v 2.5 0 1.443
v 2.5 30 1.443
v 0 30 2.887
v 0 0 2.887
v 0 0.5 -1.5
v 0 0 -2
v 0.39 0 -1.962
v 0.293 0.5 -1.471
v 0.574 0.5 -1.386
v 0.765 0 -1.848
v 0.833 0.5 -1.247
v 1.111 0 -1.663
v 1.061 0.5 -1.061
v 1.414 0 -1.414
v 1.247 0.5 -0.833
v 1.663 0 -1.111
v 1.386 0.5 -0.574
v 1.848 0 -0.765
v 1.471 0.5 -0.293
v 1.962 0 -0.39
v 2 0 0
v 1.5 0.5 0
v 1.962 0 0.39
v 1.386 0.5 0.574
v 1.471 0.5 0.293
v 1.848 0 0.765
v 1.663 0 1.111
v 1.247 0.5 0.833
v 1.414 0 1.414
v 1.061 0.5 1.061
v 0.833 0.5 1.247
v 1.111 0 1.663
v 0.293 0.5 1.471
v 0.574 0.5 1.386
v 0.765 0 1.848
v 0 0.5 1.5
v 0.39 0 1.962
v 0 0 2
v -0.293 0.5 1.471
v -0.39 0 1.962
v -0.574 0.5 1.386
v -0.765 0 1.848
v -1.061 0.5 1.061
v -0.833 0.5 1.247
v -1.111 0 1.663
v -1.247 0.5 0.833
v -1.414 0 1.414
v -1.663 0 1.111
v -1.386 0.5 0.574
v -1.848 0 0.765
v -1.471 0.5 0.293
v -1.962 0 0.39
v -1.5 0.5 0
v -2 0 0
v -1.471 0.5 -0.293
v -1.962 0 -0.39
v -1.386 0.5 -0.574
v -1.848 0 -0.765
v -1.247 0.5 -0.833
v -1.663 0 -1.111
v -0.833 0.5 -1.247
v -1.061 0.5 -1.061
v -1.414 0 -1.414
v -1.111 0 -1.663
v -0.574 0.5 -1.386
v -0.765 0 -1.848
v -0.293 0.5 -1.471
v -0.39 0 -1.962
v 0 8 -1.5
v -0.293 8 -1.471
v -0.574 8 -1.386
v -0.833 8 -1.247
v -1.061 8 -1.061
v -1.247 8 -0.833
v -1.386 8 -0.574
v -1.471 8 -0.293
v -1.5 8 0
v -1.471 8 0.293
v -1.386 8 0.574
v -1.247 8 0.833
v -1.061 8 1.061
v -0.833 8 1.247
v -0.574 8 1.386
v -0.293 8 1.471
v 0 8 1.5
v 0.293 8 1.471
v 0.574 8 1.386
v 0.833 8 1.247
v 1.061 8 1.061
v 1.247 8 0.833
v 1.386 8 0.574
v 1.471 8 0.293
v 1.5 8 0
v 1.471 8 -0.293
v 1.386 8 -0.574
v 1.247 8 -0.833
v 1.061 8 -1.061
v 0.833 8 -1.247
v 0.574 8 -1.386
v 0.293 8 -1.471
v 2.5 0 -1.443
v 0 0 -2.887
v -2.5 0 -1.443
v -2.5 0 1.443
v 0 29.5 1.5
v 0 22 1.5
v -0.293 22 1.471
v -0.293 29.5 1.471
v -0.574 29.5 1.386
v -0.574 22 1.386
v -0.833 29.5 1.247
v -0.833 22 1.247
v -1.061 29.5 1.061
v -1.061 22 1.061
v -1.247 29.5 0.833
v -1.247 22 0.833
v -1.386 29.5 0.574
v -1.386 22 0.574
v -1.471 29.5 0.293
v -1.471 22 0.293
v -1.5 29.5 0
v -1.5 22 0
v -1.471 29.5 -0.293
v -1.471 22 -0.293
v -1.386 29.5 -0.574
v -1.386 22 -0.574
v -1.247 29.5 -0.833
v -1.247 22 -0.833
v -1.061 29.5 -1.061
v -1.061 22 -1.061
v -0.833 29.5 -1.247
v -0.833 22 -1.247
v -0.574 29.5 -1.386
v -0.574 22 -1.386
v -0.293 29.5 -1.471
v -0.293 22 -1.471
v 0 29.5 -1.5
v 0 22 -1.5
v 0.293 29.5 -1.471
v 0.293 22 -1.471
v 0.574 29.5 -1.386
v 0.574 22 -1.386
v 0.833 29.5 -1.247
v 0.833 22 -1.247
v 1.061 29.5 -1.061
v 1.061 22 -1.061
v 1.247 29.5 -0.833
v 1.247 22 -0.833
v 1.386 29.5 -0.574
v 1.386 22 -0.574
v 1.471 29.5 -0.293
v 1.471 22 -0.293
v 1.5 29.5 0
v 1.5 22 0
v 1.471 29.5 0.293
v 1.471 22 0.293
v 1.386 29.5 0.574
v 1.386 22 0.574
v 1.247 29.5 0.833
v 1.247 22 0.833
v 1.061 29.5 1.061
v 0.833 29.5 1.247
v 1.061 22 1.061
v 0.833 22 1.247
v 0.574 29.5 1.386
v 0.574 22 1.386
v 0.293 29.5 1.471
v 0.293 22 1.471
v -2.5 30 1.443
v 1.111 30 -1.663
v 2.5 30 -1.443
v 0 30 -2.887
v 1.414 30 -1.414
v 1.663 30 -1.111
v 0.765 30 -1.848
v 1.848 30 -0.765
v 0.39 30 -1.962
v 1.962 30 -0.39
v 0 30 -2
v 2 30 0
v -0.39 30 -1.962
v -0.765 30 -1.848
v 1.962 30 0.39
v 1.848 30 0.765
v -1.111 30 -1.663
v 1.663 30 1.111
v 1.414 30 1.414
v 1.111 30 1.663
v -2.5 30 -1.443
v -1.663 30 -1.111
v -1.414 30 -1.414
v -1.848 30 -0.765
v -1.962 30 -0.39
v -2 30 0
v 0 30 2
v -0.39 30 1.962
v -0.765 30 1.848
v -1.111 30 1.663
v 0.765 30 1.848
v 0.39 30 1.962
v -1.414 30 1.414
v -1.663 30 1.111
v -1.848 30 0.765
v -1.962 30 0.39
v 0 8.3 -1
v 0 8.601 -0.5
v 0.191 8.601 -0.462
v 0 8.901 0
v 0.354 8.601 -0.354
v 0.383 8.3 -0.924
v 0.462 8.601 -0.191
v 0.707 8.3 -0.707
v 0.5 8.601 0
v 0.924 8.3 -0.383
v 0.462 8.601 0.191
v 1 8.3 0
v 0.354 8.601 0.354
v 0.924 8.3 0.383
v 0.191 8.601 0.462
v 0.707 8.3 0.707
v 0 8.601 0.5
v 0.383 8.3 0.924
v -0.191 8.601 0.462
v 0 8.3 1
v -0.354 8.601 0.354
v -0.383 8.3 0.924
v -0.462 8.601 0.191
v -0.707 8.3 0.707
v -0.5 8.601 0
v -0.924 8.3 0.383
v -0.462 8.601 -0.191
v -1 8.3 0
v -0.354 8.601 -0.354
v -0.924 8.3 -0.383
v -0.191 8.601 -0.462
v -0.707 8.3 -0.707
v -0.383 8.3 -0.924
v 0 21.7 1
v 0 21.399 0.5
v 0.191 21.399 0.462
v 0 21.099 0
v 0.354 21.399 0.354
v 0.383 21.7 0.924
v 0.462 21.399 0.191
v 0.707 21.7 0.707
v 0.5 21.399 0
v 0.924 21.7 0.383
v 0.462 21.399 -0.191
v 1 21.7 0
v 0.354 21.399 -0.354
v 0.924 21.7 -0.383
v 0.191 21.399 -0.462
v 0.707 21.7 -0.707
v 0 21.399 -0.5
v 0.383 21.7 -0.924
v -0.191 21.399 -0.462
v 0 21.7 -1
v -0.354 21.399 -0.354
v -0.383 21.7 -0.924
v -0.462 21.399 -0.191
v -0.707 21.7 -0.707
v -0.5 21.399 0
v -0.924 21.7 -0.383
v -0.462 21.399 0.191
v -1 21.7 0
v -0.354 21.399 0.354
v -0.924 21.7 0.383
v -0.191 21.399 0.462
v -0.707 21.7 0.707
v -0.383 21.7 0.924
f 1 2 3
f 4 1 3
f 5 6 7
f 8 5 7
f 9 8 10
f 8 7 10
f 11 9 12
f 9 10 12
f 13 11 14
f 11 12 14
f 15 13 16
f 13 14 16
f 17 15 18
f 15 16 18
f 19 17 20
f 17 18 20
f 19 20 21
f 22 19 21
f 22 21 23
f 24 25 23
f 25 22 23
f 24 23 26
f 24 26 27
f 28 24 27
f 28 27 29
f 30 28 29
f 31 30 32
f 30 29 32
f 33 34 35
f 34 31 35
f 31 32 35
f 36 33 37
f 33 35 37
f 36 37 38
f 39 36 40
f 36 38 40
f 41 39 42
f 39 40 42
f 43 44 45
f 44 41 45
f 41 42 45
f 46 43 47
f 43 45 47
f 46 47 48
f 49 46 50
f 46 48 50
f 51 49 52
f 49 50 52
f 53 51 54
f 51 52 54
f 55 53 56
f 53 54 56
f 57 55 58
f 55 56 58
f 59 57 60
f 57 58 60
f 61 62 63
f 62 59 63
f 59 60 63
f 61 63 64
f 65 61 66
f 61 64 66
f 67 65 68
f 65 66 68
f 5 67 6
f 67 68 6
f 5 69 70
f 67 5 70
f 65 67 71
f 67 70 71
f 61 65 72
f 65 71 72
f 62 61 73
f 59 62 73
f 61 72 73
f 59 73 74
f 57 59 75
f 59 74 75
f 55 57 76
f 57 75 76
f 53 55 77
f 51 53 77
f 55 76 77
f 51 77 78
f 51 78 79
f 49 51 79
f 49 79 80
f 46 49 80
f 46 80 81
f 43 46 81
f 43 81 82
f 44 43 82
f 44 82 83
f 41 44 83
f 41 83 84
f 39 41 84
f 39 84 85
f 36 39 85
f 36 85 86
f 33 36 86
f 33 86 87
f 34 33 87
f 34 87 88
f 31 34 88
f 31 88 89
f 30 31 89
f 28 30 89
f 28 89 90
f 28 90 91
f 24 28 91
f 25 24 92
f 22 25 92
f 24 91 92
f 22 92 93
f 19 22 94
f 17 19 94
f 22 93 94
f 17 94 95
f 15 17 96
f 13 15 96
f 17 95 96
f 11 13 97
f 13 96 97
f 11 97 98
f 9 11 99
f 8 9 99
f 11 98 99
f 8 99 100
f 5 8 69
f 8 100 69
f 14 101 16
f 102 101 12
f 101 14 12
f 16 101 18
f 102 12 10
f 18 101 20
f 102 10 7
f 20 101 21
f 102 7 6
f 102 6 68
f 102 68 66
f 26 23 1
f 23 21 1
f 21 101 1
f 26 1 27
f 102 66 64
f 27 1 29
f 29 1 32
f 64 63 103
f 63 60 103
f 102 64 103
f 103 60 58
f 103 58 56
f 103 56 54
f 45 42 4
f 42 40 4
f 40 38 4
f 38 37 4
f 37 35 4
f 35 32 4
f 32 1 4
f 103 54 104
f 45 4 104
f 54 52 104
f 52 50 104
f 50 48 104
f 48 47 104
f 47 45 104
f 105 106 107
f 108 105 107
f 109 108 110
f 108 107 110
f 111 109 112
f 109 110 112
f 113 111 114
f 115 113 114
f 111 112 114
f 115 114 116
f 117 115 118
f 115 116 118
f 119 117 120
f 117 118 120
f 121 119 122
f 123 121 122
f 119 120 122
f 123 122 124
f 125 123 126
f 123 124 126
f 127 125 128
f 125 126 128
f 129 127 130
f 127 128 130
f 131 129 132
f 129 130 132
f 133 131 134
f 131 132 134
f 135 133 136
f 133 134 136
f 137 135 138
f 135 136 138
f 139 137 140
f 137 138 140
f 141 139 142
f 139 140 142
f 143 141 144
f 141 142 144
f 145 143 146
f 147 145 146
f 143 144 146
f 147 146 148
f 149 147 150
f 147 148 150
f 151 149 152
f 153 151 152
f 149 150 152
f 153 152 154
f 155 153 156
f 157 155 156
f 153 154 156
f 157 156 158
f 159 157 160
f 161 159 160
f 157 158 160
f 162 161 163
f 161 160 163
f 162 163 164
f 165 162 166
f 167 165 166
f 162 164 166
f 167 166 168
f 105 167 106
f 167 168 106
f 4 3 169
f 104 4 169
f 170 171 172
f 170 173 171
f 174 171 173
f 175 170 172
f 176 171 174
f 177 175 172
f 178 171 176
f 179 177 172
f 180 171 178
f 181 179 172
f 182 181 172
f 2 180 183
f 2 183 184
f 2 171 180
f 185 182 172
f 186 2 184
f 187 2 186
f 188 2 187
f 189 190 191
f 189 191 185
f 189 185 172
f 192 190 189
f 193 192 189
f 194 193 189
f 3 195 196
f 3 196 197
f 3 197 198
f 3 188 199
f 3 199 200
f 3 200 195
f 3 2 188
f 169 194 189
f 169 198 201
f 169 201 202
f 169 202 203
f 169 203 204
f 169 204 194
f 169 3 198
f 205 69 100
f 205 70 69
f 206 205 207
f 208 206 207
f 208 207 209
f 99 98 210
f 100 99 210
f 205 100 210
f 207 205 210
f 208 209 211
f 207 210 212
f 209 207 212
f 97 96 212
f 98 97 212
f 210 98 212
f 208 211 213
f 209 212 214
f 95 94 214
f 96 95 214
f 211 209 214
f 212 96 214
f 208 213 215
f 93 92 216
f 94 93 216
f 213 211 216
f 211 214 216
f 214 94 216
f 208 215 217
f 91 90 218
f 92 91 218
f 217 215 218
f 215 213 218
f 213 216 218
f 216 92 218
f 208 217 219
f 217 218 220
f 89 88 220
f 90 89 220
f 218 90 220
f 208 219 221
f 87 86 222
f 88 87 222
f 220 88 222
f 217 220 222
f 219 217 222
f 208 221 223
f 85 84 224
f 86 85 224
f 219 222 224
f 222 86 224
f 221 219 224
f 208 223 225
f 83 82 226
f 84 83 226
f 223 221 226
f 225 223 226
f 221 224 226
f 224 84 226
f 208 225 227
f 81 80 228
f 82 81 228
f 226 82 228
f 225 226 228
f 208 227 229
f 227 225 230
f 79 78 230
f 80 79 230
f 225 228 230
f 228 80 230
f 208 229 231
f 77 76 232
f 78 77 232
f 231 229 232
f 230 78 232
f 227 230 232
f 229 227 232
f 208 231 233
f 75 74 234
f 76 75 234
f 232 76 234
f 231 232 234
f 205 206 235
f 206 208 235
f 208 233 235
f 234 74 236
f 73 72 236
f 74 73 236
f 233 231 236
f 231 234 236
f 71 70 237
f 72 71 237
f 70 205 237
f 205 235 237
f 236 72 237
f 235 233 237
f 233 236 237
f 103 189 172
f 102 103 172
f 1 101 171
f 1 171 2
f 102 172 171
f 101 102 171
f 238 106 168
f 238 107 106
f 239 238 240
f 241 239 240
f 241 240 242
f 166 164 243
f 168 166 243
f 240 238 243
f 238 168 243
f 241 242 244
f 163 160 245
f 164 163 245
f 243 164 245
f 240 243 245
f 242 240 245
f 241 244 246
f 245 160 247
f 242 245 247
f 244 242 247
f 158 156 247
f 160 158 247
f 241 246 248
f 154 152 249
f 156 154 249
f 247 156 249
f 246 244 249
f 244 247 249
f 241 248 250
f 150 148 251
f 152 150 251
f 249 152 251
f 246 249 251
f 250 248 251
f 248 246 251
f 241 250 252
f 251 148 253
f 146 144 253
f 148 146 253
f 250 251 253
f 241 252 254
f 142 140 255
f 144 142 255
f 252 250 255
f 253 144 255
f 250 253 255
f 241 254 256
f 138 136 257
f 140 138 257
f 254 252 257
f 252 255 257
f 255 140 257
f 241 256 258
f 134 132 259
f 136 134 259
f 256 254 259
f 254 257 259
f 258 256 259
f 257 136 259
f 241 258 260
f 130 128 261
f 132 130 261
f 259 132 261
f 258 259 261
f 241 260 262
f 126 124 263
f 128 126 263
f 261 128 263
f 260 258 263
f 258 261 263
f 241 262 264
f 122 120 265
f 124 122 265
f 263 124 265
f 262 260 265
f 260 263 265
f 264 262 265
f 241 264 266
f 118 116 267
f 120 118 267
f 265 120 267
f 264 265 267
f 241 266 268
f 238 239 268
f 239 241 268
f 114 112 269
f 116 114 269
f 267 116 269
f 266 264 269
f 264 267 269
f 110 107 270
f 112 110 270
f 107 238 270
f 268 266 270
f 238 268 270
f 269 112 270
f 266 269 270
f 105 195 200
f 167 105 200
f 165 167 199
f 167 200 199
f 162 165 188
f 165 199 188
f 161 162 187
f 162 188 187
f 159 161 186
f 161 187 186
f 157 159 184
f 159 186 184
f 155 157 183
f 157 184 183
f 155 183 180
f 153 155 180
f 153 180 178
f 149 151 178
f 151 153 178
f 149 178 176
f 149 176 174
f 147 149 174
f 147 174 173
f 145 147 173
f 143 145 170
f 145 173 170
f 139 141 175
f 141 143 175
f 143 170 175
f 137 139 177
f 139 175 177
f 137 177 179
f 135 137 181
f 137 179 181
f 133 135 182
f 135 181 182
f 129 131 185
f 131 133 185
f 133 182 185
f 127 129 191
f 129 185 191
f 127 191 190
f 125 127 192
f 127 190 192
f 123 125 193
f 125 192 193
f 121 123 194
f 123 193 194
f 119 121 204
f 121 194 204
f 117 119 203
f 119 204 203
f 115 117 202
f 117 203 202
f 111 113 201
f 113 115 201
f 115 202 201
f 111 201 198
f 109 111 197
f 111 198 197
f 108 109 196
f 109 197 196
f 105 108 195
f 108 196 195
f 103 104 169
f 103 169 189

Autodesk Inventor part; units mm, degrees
ref_plane "YZ Plane" through (0, 0, 0) normal (1, 0, 0) x (0, 1, 0)
ref_plane "XZ Plane" through (0, 0, 0) normal (0, 1, 0) x (-1, 0, 0)
ref_plane "XY Plane" through (0, 0, 0) normal (0, 0, 1) x (1, 0, 0)
sketch "Boceto1" plane through (0, 0, 0) normal (0, 1, 0) x (-1, 0, 0)
  line L0 (2.5, -1.4434) -> (0, -2.8868)
  line L1 (0, -2.8868) -> (-2.5, -1.4434)
  line L2 (-2.5, -1.4434) -> (-2.5, 1.4434)
  line L3 (-2.5, 1.4434) -> (0, 2.8868)
  line L4 (0, 2.8868) -> (2.5, 1.4434)
  line L5 (2.5, 1.4434) -> (2.5, -1.4434)
  point P0 (0, 0)
  point P1 (0, 0)
  dimension "d0" = 5
extrude "Extrusión1" add sketch "Boceto1" along normal blind 30
sketch "Boceto2" plane through (0, 0, 0) normal (0, -1, 0) x (1, 0, 0)
  point P0 (0, 0)
  point P1 (0, 0)
hole "Agujero1" at (0, 0, 0) direction (0, 1, 0) diameter 3 depth 8 tip angle 118 countersink diameter 4 countersink angle 90
sketch "Boceto3" plane through (0, 30, 0) normal (0, 1, 0) x (1, 0, 0)
  circle A0 centre (0, 0) radius 1.5 projected
hole "Agujero2" at (0, 30, 0) direction (0, -1, 0) diameter 3 depth 8 tip angle 118 countersink diameter 4 countersink angle 90
properties part number "Separador M3 x 25 mm"
